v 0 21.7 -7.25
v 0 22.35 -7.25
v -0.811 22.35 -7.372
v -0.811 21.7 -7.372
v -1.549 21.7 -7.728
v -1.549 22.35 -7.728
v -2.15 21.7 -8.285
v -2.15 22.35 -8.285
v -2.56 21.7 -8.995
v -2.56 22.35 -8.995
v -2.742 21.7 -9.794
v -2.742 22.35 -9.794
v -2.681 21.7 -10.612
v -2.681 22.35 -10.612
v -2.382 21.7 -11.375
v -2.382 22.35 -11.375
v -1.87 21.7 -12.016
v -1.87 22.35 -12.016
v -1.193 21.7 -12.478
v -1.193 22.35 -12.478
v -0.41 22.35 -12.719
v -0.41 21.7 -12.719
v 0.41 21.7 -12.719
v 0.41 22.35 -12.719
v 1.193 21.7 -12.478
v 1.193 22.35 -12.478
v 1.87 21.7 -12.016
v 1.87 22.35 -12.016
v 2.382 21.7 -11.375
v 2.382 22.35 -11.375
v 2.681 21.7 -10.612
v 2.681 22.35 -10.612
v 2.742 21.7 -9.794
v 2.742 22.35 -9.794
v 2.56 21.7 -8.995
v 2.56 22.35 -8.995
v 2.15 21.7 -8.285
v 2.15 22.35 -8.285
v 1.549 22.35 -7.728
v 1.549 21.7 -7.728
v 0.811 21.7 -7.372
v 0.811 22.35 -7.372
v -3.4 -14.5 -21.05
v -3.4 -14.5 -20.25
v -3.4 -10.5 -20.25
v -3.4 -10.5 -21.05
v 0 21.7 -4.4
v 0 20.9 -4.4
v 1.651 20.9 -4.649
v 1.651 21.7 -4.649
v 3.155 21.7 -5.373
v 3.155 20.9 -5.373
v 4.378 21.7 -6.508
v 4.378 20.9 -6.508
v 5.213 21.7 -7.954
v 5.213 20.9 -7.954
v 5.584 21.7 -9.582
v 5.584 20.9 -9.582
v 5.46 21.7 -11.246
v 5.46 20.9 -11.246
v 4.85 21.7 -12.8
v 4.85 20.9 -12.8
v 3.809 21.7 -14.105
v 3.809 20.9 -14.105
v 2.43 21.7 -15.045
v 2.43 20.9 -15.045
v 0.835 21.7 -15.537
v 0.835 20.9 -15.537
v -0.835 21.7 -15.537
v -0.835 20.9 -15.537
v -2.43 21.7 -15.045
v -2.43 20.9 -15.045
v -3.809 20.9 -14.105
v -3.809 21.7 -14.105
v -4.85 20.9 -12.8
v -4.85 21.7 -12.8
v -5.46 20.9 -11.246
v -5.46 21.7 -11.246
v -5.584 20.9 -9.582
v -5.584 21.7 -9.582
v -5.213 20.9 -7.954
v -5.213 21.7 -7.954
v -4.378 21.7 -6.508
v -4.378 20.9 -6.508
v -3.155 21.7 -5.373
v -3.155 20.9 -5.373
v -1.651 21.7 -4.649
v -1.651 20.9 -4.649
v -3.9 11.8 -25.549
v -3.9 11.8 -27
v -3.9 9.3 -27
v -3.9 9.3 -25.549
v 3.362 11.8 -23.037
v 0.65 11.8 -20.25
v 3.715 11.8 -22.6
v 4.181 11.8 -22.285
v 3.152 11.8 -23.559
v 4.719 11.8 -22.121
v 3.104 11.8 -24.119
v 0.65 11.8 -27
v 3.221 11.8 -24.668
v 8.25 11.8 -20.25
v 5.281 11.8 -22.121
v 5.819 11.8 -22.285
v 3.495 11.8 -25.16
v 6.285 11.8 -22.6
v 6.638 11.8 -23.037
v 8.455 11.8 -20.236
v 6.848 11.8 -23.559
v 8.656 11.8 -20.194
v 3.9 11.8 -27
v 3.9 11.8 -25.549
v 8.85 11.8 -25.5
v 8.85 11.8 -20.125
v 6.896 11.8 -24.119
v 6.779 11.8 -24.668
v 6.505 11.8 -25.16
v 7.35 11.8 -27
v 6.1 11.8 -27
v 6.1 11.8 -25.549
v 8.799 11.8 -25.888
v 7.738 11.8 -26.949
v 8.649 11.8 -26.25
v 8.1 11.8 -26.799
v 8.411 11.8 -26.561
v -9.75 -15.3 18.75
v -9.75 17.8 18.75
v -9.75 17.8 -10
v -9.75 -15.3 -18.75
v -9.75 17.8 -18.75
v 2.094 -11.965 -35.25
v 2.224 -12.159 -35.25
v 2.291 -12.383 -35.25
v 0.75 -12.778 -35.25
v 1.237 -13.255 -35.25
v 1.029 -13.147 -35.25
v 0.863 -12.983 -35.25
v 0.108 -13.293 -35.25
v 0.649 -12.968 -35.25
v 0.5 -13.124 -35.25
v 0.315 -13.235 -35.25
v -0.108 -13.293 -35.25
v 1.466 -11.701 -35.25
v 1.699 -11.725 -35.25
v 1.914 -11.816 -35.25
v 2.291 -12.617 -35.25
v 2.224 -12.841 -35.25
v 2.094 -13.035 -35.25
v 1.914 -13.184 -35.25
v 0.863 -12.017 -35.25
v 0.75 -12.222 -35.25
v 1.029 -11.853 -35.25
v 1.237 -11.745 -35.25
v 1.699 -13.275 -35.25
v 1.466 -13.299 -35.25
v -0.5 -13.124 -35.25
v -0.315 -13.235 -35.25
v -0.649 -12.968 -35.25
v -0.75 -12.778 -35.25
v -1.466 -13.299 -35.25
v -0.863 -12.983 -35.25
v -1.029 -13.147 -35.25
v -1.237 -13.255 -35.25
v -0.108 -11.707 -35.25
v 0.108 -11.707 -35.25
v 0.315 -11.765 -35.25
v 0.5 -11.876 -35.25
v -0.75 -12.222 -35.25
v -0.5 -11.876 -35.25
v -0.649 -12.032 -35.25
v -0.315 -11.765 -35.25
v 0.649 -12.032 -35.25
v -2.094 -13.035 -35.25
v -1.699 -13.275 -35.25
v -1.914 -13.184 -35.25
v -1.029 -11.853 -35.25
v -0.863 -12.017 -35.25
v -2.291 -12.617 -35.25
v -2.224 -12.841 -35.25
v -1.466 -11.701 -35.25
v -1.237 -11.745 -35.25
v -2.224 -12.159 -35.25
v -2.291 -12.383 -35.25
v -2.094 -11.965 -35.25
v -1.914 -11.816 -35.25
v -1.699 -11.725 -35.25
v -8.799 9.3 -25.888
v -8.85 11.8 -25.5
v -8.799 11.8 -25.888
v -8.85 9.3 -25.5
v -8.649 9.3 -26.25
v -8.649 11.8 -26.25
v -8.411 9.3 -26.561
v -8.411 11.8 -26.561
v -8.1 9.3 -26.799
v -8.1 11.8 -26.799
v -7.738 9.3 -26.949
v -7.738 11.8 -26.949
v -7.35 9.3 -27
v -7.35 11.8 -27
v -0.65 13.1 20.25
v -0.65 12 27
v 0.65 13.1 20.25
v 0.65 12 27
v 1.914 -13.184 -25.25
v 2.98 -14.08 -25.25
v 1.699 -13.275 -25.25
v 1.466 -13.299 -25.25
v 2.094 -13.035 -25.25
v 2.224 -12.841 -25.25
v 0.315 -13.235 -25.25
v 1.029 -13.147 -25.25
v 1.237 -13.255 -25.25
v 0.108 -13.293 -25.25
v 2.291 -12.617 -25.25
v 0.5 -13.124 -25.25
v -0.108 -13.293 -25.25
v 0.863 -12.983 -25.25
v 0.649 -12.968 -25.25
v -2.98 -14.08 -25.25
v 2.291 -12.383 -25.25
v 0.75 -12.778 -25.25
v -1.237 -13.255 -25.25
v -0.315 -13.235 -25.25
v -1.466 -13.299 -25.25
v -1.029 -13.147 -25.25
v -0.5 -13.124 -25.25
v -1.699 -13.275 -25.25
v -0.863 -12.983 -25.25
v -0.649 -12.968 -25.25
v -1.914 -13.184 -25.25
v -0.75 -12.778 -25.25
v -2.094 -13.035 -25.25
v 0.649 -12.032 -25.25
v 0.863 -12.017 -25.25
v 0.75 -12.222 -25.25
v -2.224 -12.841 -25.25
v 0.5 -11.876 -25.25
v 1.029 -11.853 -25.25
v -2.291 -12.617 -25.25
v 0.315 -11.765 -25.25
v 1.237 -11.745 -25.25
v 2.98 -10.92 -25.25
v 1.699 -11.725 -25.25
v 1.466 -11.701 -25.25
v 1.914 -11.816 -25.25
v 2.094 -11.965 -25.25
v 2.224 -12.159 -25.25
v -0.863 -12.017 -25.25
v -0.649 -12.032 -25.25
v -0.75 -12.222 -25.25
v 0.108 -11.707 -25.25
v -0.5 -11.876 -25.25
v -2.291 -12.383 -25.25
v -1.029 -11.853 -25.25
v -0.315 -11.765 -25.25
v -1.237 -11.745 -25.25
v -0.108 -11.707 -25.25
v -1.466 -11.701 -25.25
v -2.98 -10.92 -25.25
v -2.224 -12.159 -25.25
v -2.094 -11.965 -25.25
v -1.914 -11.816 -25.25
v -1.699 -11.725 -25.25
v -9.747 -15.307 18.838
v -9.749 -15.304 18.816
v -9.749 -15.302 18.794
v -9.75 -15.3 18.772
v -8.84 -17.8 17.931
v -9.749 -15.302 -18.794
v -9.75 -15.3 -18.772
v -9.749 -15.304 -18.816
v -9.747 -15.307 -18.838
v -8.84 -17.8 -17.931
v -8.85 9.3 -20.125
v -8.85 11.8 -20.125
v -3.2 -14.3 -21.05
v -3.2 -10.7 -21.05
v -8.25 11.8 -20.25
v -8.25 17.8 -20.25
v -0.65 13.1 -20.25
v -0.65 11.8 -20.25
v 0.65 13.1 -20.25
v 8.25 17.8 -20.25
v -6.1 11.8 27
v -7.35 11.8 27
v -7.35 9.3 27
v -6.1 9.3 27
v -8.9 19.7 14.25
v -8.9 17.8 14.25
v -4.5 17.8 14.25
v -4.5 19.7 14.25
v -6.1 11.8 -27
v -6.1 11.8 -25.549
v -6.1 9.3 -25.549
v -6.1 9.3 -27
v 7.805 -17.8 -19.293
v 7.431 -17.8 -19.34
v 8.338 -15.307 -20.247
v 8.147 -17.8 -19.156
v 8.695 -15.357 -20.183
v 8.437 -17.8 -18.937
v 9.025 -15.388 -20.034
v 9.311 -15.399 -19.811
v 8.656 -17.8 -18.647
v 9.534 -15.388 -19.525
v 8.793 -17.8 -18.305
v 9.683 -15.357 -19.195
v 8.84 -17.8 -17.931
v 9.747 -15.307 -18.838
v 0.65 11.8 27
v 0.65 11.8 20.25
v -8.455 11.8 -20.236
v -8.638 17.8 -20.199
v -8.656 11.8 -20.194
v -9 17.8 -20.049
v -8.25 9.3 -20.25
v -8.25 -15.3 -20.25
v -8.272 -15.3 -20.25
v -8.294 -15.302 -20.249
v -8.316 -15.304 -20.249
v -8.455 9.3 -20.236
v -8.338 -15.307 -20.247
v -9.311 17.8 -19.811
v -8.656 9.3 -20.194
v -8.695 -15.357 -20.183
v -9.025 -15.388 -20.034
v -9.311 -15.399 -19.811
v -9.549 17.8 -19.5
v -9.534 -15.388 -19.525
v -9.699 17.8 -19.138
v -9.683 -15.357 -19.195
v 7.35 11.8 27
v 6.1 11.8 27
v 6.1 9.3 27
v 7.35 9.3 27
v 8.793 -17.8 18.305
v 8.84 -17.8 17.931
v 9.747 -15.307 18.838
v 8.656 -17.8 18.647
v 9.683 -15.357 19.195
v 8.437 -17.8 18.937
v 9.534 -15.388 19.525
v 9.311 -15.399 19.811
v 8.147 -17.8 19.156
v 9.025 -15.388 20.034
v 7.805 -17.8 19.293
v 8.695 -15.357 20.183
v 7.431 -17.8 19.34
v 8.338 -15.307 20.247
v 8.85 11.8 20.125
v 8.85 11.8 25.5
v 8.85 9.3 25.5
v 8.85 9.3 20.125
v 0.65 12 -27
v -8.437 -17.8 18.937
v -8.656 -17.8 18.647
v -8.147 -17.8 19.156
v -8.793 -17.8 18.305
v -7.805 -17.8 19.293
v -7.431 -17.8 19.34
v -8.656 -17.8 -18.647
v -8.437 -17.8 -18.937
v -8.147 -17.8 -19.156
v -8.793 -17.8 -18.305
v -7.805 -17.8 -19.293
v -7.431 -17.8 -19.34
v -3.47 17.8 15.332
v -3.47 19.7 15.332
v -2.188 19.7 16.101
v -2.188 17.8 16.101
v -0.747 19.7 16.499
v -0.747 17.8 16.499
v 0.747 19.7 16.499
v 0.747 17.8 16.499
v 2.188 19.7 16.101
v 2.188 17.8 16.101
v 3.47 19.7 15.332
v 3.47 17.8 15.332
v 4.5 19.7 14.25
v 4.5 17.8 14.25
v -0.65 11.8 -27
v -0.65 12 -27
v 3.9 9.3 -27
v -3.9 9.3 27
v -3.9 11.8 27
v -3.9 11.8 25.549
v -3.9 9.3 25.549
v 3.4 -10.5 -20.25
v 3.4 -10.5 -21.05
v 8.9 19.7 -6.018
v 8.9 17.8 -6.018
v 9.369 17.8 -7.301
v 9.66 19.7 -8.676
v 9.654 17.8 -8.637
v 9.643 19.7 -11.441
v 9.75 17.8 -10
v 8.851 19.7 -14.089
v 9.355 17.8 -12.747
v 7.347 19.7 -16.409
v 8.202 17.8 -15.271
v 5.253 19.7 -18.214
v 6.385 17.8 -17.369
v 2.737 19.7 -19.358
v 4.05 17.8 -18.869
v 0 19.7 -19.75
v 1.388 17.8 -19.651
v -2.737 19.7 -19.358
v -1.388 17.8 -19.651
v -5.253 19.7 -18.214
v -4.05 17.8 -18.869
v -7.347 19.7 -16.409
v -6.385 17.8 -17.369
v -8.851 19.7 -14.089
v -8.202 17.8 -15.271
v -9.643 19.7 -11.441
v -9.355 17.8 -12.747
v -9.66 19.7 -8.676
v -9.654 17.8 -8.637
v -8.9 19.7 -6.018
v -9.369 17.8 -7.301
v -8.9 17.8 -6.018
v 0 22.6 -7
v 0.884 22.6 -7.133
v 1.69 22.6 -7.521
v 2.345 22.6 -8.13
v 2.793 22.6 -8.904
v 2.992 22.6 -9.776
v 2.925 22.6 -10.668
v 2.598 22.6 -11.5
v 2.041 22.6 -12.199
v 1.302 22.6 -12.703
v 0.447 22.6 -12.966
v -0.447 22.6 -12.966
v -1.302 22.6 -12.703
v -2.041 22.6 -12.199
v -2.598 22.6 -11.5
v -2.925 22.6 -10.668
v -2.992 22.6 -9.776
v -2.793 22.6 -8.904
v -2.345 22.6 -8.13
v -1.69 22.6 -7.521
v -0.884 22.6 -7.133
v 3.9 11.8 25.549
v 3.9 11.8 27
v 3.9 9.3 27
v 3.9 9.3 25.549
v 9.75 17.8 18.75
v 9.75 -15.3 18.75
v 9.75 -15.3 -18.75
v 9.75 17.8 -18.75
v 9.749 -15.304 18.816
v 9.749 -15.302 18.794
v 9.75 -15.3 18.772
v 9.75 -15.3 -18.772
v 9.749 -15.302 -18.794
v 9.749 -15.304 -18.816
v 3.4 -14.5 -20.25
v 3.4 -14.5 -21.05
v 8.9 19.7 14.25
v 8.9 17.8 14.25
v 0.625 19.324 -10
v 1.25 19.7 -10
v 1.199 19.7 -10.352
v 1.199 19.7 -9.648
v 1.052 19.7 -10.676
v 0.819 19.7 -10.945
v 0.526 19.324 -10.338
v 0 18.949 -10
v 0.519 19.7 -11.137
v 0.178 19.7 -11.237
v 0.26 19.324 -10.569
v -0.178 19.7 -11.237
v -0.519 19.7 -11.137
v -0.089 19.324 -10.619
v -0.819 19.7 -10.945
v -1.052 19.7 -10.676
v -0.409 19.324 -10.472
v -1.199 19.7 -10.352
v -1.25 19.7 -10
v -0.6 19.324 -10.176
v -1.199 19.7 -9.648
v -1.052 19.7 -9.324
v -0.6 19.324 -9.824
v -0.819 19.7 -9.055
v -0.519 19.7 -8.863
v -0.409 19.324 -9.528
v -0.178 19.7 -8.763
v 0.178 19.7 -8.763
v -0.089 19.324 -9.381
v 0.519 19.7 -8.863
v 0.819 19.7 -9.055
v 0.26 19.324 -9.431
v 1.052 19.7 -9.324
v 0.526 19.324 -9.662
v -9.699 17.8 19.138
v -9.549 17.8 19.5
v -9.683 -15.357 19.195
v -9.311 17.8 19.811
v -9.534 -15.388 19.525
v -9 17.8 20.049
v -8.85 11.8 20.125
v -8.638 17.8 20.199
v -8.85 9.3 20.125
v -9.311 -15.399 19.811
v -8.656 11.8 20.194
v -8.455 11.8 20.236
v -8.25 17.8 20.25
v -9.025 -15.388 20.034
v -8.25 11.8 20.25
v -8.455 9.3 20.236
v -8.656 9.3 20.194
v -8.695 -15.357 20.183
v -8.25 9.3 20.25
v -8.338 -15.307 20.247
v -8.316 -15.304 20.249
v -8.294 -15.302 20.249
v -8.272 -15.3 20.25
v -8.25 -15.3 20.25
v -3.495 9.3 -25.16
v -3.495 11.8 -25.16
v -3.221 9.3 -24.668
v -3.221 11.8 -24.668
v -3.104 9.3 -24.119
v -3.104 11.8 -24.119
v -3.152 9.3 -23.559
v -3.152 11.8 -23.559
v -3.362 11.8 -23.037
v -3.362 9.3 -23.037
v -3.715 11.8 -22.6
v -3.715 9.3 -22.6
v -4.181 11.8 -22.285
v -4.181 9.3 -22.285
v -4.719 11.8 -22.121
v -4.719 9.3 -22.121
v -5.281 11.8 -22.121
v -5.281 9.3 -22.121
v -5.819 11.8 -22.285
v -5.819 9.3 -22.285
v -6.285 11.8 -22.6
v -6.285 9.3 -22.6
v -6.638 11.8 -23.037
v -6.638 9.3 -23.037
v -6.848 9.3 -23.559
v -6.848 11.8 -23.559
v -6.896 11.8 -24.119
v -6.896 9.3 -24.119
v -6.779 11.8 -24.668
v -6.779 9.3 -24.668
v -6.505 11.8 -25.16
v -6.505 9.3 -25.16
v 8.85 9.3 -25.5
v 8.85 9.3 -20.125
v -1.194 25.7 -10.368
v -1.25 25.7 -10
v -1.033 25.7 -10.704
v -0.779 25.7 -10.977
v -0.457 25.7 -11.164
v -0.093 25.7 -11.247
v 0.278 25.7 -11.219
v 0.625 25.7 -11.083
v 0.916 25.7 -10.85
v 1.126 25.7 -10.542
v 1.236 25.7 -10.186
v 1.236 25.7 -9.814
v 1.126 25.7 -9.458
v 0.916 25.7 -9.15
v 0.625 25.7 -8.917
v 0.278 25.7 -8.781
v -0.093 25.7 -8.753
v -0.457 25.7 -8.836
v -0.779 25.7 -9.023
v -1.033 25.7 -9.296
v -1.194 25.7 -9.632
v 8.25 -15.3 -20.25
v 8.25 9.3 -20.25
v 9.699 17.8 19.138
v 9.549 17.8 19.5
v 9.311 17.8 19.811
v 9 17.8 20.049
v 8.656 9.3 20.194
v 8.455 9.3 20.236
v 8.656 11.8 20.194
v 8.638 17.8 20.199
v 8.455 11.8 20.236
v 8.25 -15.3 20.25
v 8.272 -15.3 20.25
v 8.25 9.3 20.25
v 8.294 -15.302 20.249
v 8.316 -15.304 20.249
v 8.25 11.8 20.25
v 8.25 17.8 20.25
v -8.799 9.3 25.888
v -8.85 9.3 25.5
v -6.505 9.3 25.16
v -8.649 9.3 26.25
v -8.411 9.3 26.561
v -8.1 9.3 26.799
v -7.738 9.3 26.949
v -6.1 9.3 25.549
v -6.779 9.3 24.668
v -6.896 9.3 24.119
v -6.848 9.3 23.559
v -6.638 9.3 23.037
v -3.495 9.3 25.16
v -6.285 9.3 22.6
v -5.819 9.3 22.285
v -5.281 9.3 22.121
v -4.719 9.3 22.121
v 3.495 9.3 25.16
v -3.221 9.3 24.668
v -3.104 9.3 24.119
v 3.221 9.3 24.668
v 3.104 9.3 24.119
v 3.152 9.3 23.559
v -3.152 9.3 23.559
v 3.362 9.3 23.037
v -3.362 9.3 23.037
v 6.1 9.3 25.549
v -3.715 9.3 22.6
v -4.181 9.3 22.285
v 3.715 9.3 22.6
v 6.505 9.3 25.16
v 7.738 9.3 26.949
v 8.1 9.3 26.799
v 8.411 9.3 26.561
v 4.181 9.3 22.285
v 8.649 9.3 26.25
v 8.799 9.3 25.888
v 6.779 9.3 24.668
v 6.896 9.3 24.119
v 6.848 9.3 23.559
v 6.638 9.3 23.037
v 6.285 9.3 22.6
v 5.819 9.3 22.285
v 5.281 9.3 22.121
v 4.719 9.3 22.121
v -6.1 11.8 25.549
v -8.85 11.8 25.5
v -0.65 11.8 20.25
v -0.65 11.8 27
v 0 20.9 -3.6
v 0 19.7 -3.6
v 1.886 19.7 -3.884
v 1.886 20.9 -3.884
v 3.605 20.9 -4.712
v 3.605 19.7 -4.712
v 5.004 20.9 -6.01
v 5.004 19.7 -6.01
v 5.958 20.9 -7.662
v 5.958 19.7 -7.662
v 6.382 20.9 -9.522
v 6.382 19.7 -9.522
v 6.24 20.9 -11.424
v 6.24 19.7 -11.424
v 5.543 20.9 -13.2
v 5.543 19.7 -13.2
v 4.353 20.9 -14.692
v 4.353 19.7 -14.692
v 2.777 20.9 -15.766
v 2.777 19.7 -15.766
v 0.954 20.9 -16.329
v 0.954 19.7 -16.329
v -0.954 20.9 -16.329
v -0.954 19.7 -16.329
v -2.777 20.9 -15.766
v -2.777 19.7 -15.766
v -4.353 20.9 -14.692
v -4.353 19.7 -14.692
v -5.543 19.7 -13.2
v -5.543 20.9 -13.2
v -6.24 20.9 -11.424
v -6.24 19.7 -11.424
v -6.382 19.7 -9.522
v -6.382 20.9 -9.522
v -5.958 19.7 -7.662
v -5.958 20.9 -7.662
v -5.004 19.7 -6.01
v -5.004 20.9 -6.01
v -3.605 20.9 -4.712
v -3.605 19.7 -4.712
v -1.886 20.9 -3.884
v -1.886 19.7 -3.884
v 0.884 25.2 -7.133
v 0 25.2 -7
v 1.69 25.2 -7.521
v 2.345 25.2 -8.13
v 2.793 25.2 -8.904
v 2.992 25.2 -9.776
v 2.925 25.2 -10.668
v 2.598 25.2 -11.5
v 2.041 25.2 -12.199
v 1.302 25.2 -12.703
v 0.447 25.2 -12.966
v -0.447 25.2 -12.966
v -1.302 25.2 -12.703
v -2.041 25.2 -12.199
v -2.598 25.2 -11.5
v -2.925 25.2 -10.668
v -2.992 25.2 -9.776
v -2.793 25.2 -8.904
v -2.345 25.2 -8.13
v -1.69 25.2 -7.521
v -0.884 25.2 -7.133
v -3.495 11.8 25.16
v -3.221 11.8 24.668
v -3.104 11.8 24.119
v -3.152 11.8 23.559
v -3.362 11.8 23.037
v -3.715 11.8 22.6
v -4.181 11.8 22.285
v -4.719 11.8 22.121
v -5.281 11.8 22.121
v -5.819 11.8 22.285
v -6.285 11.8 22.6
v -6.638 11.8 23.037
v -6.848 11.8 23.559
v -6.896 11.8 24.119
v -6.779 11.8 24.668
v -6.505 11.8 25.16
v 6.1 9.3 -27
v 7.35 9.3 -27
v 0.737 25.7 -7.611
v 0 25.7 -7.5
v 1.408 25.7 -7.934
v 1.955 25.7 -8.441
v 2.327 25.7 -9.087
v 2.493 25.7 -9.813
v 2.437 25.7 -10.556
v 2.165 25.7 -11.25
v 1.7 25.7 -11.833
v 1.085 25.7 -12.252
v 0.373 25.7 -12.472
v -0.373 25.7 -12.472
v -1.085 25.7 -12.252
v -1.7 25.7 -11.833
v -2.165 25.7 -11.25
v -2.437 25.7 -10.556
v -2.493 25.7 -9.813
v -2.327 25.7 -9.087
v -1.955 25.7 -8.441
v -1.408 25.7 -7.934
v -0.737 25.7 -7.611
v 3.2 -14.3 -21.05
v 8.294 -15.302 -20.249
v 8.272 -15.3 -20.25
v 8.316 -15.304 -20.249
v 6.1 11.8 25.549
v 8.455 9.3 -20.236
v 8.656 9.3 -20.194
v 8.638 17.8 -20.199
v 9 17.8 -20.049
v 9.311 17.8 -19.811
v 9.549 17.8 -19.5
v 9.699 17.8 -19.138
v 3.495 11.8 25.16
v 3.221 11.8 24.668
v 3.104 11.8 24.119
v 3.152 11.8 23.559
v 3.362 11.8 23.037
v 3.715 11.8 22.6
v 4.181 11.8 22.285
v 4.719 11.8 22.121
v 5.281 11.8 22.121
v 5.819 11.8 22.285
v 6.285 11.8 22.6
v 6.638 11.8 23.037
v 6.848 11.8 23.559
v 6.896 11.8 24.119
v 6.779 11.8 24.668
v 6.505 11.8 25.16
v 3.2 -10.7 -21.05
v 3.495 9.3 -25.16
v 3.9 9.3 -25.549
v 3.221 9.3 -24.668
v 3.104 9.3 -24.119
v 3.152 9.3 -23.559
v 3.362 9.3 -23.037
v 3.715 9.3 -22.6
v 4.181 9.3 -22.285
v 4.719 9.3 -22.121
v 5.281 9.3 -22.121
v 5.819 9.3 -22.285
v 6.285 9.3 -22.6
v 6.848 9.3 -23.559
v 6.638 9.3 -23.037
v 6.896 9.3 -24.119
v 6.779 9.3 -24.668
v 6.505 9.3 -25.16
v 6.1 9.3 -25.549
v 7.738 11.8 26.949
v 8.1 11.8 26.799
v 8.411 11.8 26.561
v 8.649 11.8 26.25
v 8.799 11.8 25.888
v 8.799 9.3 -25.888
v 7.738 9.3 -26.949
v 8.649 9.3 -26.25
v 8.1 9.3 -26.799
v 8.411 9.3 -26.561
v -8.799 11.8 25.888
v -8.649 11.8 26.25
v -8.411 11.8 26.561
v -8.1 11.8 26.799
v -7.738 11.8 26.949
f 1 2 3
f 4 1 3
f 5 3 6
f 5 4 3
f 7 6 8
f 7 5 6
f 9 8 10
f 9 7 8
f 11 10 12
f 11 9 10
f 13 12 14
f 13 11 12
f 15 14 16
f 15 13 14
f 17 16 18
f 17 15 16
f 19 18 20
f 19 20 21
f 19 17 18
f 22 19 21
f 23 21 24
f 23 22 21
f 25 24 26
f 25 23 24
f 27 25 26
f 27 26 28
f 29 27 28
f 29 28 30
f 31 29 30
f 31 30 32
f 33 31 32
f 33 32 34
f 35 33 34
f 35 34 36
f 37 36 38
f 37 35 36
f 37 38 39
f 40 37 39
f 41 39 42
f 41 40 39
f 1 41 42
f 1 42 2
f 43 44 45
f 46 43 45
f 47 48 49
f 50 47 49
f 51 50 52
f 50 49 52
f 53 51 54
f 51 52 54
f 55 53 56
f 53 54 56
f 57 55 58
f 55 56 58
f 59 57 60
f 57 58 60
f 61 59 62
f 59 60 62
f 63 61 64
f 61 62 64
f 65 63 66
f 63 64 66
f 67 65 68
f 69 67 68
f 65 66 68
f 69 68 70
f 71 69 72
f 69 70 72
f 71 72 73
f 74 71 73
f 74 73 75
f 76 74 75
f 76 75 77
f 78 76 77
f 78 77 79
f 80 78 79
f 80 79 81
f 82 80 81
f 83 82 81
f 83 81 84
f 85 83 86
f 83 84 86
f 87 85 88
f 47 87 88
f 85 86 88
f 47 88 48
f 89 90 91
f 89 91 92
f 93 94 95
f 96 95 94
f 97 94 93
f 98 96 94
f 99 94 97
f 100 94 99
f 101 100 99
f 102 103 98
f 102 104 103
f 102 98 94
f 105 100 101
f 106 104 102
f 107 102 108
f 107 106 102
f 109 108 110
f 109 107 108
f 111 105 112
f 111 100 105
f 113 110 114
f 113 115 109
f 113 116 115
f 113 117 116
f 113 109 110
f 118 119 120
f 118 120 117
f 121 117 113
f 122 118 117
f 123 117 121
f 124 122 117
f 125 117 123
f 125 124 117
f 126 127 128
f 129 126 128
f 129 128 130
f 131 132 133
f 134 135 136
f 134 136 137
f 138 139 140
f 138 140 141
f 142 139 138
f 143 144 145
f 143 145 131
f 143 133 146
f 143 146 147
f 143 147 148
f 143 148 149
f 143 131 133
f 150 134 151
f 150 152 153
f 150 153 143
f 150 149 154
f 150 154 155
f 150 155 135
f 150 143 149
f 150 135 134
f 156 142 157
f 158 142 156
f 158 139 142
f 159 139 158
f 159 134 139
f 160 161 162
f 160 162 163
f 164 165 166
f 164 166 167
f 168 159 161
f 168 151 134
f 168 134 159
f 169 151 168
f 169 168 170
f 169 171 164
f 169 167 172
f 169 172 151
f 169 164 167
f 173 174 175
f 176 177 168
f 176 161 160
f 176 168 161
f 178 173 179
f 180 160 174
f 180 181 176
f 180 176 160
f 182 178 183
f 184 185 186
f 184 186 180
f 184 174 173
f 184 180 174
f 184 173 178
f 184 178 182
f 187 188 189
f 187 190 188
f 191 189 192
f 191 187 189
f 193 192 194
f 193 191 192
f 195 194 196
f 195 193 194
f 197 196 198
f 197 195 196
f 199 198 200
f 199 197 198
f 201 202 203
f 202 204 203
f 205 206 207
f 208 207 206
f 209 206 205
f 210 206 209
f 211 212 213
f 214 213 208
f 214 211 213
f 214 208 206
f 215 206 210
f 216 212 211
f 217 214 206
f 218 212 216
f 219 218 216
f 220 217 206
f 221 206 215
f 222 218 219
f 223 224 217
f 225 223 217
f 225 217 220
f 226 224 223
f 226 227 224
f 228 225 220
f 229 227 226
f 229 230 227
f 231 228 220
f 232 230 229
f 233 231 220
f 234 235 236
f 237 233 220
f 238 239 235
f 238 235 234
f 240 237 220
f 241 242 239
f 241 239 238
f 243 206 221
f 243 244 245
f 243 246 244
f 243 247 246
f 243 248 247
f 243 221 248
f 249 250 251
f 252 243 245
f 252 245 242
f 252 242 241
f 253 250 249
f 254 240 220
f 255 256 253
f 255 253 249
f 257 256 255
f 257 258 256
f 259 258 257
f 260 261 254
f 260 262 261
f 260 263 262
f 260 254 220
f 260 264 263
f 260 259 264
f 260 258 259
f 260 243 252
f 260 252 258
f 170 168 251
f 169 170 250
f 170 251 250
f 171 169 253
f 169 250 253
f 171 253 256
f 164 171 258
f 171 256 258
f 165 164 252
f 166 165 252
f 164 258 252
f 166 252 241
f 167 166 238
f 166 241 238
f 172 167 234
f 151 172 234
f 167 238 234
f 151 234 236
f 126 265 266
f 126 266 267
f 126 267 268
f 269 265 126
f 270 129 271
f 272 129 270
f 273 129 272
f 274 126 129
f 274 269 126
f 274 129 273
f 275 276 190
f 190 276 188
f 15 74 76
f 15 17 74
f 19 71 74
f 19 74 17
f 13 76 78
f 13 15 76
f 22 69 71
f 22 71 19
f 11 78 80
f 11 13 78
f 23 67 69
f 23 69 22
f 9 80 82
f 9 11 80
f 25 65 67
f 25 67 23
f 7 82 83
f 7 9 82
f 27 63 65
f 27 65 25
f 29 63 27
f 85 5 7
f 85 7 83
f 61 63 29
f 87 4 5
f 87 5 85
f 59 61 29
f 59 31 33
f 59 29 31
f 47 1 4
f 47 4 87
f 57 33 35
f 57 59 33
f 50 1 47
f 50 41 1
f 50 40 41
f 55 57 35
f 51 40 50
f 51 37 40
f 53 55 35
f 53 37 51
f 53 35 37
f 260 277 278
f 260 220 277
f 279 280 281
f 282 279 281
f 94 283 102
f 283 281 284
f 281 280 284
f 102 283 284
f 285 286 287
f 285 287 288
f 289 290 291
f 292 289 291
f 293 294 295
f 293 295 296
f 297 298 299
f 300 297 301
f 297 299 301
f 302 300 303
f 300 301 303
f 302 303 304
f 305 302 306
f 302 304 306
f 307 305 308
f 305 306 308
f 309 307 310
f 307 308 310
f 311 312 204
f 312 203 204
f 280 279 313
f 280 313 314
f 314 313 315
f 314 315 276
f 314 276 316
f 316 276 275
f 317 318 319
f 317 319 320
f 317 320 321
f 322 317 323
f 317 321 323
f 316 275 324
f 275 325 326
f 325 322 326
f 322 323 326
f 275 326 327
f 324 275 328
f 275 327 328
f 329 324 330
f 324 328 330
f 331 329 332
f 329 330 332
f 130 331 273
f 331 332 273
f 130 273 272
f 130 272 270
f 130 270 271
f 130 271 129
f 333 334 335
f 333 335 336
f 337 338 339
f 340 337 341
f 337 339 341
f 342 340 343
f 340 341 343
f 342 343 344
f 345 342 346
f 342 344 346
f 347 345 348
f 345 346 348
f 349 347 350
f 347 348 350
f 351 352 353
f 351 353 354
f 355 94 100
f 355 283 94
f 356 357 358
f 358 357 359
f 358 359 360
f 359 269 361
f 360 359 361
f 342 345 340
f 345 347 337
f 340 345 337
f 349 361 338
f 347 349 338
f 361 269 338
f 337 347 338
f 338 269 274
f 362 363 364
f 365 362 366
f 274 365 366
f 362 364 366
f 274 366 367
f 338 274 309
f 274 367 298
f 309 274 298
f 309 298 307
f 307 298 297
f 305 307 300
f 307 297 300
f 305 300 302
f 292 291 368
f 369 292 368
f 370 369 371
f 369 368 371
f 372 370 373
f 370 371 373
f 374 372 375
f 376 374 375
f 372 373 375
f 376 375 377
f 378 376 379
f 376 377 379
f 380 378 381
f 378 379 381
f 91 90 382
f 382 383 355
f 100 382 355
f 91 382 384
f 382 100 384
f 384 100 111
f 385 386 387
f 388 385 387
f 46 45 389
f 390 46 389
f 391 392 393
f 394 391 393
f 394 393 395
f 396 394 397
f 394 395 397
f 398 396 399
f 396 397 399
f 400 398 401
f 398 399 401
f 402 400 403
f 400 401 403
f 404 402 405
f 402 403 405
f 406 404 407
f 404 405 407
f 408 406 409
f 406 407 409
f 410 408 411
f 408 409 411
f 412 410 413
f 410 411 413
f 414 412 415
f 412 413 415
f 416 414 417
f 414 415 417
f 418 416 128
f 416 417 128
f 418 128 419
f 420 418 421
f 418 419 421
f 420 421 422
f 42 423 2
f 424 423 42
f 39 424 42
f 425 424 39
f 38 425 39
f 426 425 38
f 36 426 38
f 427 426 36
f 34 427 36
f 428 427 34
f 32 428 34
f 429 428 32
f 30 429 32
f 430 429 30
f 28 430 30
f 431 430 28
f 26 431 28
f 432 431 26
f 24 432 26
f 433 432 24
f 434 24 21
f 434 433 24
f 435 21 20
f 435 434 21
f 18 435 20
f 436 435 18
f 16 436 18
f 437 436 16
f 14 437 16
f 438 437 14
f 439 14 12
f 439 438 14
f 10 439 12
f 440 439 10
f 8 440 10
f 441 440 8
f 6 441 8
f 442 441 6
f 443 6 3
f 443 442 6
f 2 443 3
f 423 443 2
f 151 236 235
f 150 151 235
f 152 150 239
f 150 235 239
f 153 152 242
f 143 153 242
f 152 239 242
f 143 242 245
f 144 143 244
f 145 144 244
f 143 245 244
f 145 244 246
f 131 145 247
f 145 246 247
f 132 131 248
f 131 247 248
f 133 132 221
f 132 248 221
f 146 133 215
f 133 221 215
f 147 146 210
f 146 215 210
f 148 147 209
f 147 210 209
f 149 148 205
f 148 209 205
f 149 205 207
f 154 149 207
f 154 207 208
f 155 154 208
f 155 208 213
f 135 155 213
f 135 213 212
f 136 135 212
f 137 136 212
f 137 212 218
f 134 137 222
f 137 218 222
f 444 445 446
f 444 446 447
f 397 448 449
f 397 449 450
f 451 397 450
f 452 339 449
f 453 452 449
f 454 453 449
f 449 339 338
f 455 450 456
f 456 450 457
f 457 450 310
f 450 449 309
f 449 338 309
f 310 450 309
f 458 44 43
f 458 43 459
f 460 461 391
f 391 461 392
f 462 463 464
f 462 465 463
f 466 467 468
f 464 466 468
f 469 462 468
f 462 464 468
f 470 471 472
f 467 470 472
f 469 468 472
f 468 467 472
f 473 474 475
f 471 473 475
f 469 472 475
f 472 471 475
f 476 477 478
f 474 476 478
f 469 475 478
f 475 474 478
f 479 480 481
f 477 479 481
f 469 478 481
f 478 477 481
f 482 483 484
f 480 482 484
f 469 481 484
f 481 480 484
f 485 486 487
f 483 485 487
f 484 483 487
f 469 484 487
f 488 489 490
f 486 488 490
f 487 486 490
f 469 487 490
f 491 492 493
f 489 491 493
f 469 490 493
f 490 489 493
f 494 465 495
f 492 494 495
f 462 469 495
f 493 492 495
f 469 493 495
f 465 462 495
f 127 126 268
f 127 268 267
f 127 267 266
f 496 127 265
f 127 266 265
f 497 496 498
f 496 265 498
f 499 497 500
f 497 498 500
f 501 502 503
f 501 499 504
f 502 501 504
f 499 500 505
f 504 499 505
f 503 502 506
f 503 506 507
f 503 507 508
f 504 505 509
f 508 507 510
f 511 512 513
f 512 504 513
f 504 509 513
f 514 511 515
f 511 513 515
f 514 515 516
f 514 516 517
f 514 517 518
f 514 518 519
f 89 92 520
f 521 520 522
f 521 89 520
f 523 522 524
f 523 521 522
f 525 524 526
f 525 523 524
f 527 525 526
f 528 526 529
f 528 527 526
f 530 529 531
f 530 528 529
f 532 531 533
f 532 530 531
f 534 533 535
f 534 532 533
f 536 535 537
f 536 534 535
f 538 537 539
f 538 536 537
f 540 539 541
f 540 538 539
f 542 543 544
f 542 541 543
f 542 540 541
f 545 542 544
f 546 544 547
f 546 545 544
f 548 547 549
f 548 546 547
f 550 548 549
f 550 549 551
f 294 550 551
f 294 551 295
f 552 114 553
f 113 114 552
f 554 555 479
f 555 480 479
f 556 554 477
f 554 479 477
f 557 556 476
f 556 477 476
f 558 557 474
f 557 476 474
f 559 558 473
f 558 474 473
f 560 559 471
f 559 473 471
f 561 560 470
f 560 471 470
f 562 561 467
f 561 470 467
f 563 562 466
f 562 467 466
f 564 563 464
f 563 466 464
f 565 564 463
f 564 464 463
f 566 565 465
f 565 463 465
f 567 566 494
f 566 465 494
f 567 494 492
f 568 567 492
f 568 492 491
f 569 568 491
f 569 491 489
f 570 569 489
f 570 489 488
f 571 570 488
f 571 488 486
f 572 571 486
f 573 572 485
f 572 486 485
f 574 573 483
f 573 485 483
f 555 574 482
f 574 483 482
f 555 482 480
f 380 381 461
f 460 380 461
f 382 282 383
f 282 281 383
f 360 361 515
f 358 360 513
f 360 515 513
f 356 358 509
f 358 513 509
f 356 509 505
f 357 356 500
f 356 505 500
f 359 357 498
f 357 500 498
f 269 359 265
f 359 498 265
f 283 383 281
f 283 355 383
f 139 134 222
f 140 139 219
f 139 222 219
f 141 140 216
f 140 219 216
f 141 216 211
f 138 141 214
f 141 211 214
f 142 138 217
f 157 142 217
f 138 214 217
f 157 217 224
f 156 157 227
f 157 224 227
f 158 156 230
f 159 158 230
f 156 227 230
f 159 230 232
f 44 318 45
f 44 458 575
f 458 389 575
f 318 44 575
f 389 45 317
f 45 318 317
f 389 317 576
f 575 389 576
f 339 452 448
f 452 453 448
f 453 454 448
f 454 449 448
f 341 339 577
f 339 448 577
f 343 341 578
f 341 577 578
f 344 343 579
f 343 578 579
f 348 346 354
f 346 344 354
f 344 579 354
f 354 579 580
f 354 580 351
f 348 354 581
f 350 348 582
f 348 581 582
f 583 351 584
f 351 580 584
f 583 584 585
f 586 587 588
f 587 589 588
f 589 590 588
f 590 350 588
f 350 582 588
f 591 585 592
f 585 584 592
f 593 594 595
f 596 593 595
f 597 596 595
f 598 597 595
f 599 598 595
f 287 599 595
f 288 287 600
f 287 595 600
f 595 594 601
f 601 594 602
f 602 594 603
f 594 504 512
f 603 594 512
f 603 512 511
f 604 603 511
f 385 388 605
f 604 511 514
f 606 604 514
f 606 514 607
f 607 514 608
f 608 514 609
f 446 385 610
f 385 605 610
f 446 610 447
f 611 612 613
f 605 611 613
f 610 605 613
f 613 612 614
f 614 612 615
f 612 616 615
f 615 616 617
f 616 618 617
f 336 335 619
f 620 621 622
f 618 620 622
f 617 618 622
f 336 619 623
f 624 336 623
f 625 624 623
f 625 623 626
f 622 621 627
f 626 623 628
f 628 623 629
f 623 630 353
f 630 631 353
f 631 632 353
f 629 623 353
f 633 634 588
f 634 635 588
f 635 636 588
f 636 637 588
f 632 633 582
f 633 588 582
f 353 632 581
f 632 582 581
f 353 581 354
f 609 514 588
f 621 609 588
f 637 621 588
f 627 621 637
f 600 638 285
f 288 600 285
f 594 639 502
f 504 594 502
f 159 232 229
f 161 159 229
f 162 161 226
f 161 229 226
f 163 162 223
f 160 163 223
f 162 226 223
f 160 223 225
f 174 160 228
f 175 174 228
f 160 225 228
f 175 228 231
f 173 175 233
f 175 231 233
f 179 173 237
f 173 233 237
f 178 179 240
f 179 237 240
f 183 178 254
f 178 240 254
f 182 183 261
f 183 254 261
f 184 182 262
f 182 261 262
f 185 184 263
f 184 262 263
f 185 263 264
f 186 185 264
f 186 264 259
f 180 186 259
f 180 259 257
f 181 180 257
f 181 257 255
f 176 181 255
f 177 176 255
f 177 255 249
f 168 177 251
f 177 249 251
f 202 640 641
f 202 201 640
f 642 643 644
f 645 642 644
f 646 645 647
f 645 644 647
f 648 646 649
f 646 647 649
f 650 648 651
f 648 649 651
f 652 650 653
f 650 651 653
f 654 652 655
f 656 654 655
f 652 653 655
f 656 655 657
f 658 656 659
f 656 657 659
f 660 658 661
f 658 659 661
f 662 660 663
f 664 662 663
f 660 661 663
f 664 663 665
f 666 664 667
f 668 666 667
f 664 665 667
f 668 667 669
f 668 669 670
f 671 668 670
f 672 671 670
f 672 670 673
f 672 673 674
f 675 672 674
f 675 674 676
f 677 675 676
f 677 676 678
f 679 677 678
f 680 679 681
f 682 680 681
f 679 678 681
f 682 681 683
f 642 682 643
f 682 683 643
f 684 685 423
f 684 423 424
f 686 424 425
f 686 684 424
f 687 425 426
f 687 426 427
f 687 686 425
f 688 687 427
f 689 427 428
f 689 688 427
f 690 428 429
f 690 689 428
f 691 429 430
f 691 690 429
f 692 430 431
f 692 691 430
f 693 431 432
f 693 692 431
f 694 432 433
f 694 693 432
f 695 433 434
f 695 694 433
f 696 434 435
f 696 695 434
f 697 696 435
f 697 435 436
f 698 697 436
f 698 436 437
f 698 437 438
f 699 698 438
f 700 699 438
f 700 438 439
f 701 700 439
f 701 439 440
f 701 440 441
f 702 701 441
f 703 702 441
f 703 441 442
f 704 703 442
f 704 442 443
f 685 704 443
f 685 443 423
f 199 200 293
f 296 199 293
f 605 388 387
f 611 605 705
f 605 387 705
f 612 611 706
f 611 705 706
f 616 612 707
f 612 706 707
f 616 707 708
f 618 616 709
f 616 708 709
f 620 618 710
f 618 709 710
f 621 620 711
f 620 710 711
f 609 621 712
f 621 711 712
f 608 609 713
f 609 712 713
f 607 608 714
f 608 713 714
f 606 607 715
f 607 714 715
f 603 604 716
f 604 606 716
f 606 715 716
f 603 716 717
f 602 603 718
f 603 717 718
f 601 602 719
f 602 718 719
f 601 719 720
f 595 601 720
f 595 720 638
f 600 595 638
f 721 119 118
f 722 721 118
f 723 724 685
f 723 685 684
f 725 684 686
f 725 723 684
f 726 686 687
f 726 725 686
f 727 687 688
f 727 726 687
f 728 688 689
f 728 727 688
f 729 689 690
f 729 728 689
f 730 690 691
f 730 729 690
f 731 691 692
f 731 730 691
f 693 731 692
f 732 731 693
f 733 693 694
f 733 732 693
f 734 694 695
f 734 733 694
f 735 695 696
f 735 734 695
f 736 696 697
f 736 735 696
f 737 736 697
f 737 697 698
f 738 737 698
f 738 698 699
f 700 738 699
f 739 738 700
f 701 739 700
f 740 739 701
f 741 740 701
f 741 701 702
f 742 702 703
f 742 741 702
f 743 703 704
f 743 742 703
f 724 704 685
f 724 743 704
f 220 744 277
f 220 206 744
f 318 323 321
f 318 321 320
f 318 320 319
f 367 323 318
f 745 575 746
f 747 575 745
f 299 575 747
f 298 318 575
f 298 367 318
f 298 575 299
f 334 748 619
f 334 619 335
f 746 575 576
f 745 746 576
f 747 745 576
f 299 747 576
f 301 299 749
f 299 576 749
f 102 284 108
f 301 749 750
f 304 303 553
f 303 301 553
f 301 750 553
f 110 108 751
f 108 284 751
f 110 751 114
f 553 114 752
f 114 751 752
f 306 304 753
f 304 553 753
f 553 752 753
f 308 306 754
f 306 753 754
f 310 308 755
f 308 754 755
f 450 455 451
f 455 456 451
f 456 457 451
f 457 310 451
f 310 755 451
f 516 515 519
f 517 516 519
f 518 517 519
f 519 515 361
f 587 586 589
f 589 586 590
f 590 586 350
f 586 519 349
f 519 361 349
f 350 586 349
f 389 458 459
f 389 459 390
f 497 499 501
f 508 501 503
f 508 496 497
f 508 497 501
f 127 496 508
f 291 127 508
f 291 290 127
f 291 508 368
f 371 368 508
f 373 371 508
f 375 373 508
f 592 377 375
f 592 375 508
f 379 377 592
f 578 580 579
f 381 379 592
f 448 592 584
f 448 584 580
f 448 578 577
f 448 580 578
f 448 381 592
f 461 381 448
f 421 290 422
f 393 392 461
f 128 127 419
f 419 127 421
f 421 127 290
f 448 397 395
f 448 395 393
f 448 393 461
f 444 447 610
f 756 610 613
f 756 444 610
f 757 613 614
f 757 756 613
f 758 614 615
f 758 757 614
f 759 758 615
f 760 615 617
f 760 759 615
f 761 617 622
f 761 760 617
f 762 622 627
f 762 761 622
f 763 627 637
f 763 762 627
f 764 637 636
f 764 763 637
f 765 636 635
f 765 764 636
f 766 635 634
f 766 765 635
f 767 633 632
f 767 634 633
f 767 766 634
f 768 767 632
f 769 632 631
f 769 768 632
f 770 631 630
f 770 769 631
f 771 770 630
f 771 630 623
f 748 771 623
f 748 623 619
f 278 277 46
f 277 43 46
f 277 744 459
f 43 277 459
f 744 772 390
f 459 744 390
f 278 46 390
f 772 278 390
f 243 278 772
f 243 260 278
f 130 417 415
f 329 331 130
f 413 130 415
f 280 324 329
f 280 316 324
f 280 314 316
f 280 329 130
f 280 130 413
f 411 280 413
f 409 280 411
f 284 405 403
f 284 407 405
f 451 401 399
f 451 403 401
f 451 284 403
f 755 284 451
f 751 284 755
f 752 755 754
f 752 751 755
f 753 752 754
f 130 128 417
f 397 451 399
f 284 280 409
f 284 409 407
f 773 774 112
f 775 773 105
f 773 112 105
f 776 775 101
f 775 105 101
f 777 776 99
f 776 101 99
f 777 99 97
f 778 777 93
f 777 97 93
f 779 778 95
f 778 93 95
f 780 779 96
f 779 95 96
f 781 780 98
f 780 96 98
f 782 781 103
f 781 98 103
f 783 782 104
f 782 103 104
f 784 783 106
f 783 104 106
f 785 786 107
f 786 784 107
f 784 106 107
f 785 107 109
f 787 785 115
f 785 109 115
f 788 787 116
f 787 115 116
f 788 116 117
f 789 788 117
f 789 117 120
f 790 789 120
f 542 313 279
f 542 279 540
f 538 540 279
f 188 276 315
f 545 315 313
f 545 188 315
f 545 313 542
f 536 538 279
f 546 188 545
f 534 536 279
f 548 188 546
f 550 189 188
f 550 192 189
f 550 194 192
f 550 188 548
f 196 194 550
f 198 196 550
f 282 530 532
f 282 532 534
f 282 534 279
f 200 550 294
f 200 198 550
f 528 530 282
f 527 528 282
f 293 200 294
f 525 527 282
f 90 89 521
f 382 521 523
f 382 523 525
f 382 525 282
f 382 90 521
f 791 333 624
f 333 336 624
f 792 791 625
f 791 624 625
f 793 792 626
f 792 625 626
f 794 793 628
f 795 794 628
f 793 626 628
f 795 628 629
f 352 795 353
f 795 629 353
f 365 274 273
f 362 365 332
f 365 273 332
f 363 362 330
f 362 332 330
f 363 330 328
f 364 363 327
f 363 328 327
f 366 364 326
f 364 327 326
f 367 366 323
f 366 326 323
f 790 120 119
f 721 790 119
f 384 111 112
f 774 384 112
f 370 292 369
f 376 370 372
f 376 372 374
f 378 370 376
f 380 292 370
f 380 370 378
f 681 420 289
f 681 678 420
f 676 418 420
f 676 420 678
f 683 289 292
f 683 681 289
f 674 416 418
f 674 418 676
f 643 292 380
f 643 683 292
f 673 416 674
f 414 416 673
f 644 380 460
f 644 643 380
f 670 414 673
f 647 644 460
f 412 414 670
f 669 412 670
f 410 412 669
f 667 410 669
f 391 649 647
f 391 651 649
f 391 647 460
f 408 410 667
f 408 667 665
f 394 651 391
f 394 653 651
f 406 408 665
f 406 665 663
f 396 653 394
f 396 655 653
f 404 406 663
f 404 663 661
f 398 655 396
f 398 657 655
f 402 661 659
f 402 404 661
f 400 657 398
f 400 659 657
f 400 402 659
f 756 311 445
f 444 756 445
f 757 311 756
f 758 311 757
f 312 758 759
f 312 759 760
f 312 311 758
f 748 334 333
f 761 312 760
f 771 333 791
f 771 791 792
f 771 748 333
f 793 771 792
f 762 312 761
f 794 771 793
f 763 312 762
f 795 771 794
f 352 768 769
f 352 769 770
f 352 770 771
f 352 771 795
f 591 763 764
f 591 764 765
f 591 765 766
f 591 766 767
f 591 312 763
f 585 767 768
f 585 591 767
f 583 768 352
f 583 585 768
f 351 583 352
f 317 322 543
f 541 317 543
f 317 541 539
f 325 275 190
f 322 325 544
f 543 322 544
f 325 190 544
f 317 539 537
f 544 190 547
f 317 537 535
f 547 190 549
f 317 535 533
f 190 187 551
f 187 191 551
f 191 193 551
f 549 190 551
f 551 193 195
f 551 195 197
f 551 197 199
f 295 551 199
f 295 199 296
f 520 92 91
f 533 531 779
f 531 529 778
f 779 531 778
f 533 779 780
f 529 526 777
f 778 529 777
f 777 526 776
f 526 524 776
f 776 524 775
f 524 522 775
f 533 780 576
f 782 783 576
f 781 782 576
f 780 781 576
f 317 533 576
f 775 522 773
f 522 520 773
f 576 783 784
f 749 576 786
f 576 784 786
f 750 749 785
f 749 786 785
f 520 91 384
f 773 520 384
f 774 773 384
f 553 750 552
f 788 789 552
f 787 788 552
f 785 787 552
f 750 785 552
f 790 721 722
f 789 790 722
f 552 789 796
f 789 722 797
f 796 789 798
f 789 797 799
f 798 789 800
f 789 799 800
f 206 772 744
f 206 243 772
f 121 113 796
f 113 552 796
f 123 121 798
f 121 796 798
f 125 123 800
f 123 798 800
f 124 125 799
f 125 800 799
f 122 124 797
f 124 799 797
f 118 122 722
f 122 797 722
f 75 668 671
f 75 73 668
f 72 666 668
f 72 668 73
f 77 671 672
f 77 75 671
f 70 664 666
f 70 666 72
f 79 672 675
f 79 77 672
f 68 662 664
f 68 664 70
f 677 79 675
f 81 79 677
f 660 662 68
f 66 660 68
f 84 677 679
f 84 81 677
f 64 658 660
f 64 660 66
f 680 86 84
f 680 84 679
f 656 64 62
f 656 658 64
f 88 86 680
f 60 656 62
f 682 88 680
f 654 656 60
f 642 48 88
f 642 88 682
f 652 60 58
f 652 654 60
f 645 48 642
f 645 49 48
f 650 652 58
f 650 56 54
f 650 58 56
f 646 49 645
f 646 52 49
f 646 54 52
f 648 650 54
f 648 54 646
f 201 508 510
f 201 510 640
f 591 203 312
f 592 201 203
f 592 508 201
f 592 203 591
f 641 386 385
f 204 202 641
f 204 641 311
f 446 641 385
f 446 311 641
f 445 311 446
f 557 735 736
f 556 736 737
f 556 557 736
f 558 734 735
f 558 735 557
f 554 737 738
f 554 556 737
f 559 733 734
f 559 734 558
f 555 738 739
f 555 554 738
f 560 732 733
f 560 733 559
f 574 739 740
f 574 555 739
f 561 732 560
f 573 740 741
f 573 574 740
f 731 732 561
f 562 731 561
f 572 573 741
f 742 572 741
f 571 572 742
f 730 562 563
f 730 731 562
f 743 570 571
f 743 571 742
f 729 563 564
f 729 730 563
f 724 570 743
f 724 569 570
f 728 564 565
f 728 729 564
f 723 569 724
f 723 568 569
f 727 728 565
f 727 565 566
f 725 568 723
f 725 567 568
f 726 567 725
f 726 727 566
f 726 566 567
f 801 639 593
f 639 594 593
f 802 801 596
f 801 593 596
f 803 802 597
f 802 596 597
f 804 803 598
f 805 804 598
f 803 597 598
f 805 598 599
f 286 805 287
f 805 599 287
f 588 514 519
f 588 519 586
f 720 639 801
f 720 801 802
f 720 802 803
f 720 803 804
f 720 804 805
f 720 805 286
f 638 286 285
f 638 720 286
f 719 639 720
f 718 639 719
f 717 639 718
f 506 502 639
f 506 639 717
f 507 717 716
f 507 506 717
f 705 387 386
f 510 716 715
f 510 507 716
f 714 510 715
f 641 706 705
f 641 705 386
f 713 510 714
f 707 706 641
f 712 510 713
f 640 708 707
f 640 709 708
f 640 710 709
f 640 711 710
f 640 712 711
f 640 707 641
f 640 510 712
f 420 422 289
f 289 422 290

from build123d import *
from OCP.BRepFilletAPI import BRepFilletAPI_MakeChamfer

# Parameters (mm, degrees)
SKETCH2_W                 = 19.5
SKETCH2_H                 = 40.5
BOSS_EXTRUDE1_DEPTH       = 17.8
CHAMFER1_SIZE             = 2.5
CHAMFER1_SIZE2            = 0.909925586
FILLET1_R                 = 1.5
BOSS_EXTRUDE2_START       = -6
SKETCH3_W                 = 17.7
SKETCH3_H                 = 54
BOSS_EXTRUDE2_DEPTH       = 2.5
FILLET2_R                 = 1.5
BOSS_EXTRUDE3_DEPTH       = 0.65
BOSS_EXTRUDE4_DEPTH       = 1.9
SKETCH6_R                 = 6.4
BOSS_EXTRUDE5_DEPTH       = 1.2
SKETCH7_R                 = 5.6
BOSS_EXTRUDE6_DEPTH       = 0.8
SKETCH8_R                 = 2.75
BOSS_EXTRUDE7_DEPTH       = 4
SKETCH9_R                 = 3
BOSS_EXTRUDE8_DEPTH       = 3.4
CHAMFER2_SIZE             = 0.3
CHAMFER3_SIZE             = 0.5
CUT_EXTRUDE1_REACH        = 43.234
MIRROR3_COPY_1_REACH      = 43.234
SKETCH12_W                = 6.8
SKETCH12_H                = 4
BOSS_EXTRUDE9_DEPTH       = 0.8
SKETCH13_W                = 6.4
SKETCH13_H                = 3.6
BOSS_EXTRUDE10_DEPTH      = 4.2
BOSS_EXTRUDE10_TAPER      = 3
BOSS_EXTRUDE11_DEPTH      = 10
M3X0_5_TAPPED_HOLE1_D     = 2.5
M3X0_5_TAPPED_HOLE1_DEPTH = 6
M3X0_5_TAPPED_HOLE1_TIP   = 0.751075774


with BuildPart() as part:
    # Sketch2 → Boss-Extrude1 (new, symmetric)
    with BuildSketch(Plane(origin=(0, 0, 0), x_dir=(1, 0, 0), z_dir=(0, 1, 0))):
        Rectangle(SKETCH2_W, SKETCH2_H)
    extrude(amount=BOSS_EXTRUDE1_DEPTH, both=True)

    # Chamfer1: one chamfer whose edges measure the first distance from different faces: ONE call of the kernel's chamfer builder (chamfer() names one face for all edges)
    chamfer1_edges_1 = [part.edges().sort_by_distance(p)[0] for p in [
        (0, -17.8, -20.25),
    ]]
    chamfer1_side_1 = [part.faces().sort_by_distance(p)[0] for p in [
        (0, 0, -20.25),
    ]]
    chamfer1_edges_2 = [part.edges().sort_by_distance(p)[0] for p in [
        (9.75, -17.8, 0),
    ]]
    chamfer1_side_2 = [part.faces().sort_by_distance(p)[0] for p in [
        (9.75, 0, 0),
    ]]
    chamfer1_edges_3 = [part.edges().sort_by_distance(p)[0] for p in [
        (0, -17.8, 20.25),
    ]]
    chamfer1_side_3 = [part.faces().sort_by_distance(p)[0] for p in [
        (0, 0, 20.25),
    ]]
    chamfer1_edges_4 = [part.edges().sort_by_distance(p)[0] for p in [
        (-9.75, -17.8, 0),
    ]]
    chamfer1_side_4 = [part.faces().sort_by_distance(p)[0] for p in [
        (-9.75, 0, 0),
    ]]
    chamfer1 = BRepFilletAPI_MakeChamfer(part.part.solid().wrapped)
    for e in chamfer1_edges_1:
        chamfer1.Add(CHAMFER1_SIZE, CHAMFER1_SIZE2, e.wrapped, chamfer1_side_1[0].wrapped)  # the first distance lies on this face
    for e in chamfer1_edges_2:
        chamfer1.Add(CHAMFER1_SIZE, CHAMFER1_SIZE2, e.wrapped, chamfer1_side_2[0].wrapped)  # the first distance lies on this face
    for e in chamfer1_edges_3:
        chamfer1.Add(CHAMFER1_SIZE, CHAMFER1_SIZE2, e.wrapped, chamfer1_side_3[0].wrapped)  # the first distance lies on this face
    for e in chamfer1_edges_4:
        chamfer1.Add(CHAMFER1_SIZE, CHAMFER1_SIZE2, e.wrapped, chamfer1_side_4[0].wrapped)  # the first distance lies on this face
    add(Compound.cast(chamfer1.Shape()), mode=Mode.REPLACE)

    # Fillet1
    # the kernel refuses this fillet: 1.5 mm, written as the material it takes off along each edge
    with BuildSketch(Plane(origin=(-10.829006934, -12.335452813, -21.329006934), x_dir=(0.9461886483394649, 0.3040991697893321, -0.11068304606838018), z_dir=(0.3236155771181854, -0.8891264907159878, 0.32361557711818534)), Plane(origin=(-10.829006934, -12.335452813, 21.329006934), x_dir=(-0.1106830460683806, 0.30409916978933194, -0.946188648339465), z_dir=(0.32361557711818534, -0.8891264907159879, -0.3236155771181854))) as fillet1_piece_1:
        with BuildLine():
            CenterArc((FILLET1_R * 0.889126490716, FILLET1_R), FILLET1_R, 186.717713464, 83.282286536)
            Line((-FILLET1_R * 0.104008041637, FILLET1_R * 0.883022221559), (0, 0))
            Line((0, 0), (FILLET1_R * 0.889126490716, 0))
        make_face()
    extrude(amount=9.480197094, mode=Mode.SUBTRACT)
    with BuildSketch(Plane(origin=(10.829006934, -12.335452813, -21.329006934), x_dir=(-0.946188648339465, 0.30409916978933194, -0.1106830460683806), z_dir=(-0.3236155771181854, -0.8891264907159879, 0.3236155771181854)), Plane(origin=(10.829006934, -12.335452813, 21.329006934), x_dir=(0.11068304606838136, 0.3040991697893317, -0.9461886483394651), z_dir=(-0.3236155771181854, -0.8891264907159879, -0.3236155771181854))) as fillet1_piece_2:
        with BuildLine():
            CenterArc((FILLET1_R * 0.889126490716, -FILLET1_R), FILLET1_R, 90, 83.282286536)
            Line((-FILLET1_R * 0.104008041637, -FILLET1_R * 0.883022221559), (0, 0))
            Line((0, 0), (FILLET1_R * 0.889126490716, 0))
        make_face()
    extrude(amount=9.480197094, mode=Mode.SUBTRACT)
    with BuildSketch(Plane(origin=(-9.75, -19.05, -20.25), x_dir=(1, 0, 0), z_dir=(0, 1, 0)), Plane(origin=(9.75, 21.55, -20.25), x_dir=(-1, 0, 0), z_dir=(0, -1, 0)), Plane(origin=(9.75, 21.55, 20.25), x_dir=(0, 0, -1), z_dir=(0, -1, 0)), Plane(origin=(-9.75, -19.05, 20.25), x_dir=(0, 0, -1), z_dir=(0, 1, 0))) as fillet1_piece_3:
        with BuildLine():
            CenterArc((FILLET1_R, -FILLET1_R), FILLET1_R, 90, 90)
            Line((0, -FILLET1_R), (0, 0))
            Line((0, 0), (FILLET1_R, 0))
        make_face()
    extrude(amount=40.6, mode=Mode.SUBTRACT)

    # Sketch3 → Boss-Extrude2 (add)
    with BuildSketch(Plane(origin=(0, 17.8, 0), x_dir=(1, 0, 0), z_dir=(0, 1, 0)).offset(BOSS_EXTRUDE2_START)):
        Rectangle(SKETCH3_W, SKETCH3_H)
    extrude(amount=-BOSS_EXTRUDE2_DEPTH)

    # Fillet2
    fillet2_edges = [part.edges().sort_by_distance(p)[0] for p in [
        (-8.85, 10.55, 27),
        (8.85, 10.55, -27),
        (-8.85, 10.55, -27),
        (8.85, 10.55, 27),
    ]]
    fillet(fillet2_edges, radius=FILLET2_R)

    # Sketch4 → Boss-Extrude3 (add, symmetric)
    with BuildSketch(Plane(origin=(0, 0, 0), x_dir=(0, 0, -1), z_dir=(1, 0, 0))):
        Polygon((-20.25, 11.8), (-27, 11.8), (-27, 12), (-20.25, 13.1), align=None)
    boss_extrude3 = extrude(amount=BOSS_EXTRUDE3_DEPTH, both=True)

    # Mirror1: Boss-Extrude3 across plane
    add(boss_extrude3.mirror(Plane.XY))

    # Sketch5 → Boss-Extrude4 (add)
    with BuildSketch(Plane(origin=(0, 17.8, 0), x_dir=(1, 0, 0), z_dir=(0, 1, 0))):
        with BuildLine():
            Line((-8.9, 6.01848019), (-8.9, -14.25))
            Line((-8.9, -14.25), (-4.5, -14.25))
            ThreePointArc((-4.5, -14.25), (0, -16.55), (4.5, -14.25))
            Line((4.5, -14.25), (8.9, -14.25))
            Line((8.9, -14.25), (8.9, 6.01848019))
            ThreePointArc((8.9, 6.01848019), (0, 19.75), (-8.9, 6.01848019))
        make_face()
    extrude(amount=BOSS_EXTRUDE4_DEPTH)

    # Sketch6 → Boss-Extrude5 (add)
    with BuildSketch(Plane(origin=(0, 19.7, 0), x_dir=(1, 0, 0), z_dir=(0, 1, 0))):
        with Locations(Location((0, 10, 0), (0, 0, 270))):
            Circle(SKETCH6_R)
    extrude(amount=BOSS_EXTRUDE5_DEPTH)

    # Sketch7 → Boss-Extrude6 (add)
    with BuildSketch(Plane(origin=(0, 20.9, 0), x_dir=(1, 0, 0), z_dir=(0, 1, 0))):
        with Locations(Location((0, 10, 0), (0, 0, 270))):
            Circle(SKETCH7_R)
    extrude(amount=BOSS_EXTRUDE6_DEPTH)

    # Sketch8 → Boss-Extrude7 (add)
    with BuildSketch(Plane(origin=(0, 21.7, 0), x_dir=(1, 0, 0), z_dir=(0, 1, 0))):
        with Locations(Location((0, 10, 0), (0, 0, 270))):
            Circle(SKETCH8_R)
    extrude(amount=BOSS_EXTRUDE7_DEPTH)

    # Sketch9 → Boss-Extrude8 (add)
    with BuildSketch(Plane(origin=(0, 25.7, 0), x_dir=(1, 0, 0), z_dir=(0, 1, 0))):
        with Locations(Location((0, 10, 0), (0, 0, 270))):
            Circle(SKETCH9_R)
    extrude(amount=-BOSS_EXTRUDE8_DEPTH)

    # Chamfer2
    # the kernel refuses this chamfer: 0.3 mm, written as the material it takes off along each edge
    with BuildSketch(Plane(origin=(0, 22.3, -10), x_dir=(0, 0, 1), z_dir=(-1, 0, 0))) as chamfer2_piece_1_section:
        Polygon((3 - CHAMFER2_SIZE, 0), (3, CHAMFER2_SIZE), (3, 0), align=None)
    chamfer2_piece_1 = revolve(axis=Axis((0, 22.3, -10), (0, 1, 0)), mode=Mode.PRIVATE)
    chamfer2_piece_1 = chamfer2_piece_1 - Plane(origin=(0, 22.47249354, -10), x_dir=(0, 0, 1), z_dir=(0, -1, 0)) * Cylinder(2.75, 12, mode=Mode.PRIVATE)
    add(chamfer2_piece_1, mode=Mode.SUBTRACT)

    # Chamfer3
    chamfer3_edges = [part.edges().sort_by_distance(p)[0] for p in [
        (0, 25.7, -13),
    ]]
    chamfer(chamfer3_edges, length=CHAMFER3_SIZE)

    # Sketch11 → Cut-Extrude1 (cut, up to next)
    with BuildSketch(Plane(origin=(0, 11.8, 0), x_dir=(1, 0, 0), z_dir=(0, 1, 0)), mode=Mode.PRIVATE) as cut_extrude1_sk1:
        with BuildLine():
            Line((6.1, -27), (3.9, -27))
            Line((3.9, -27), (3.9, -25.549193338))
            ThreePointArc((3.9, -25.549193338), (5, -22.1), (6.1, -25.549193338))
            Line((6.1, -25.549193338), (6.1, -27))
        make_face()
    cut_extrude1_tool1 = extrude(cut_extrude1_sk1.sketch, amount=-CUT_EXTRUDE1_REACH, mode=Mode.PRIVATE) & part.part
    cut_extrude1 = cut_extrude1_tool1.solids().sort_by_distance((5, 11.8, 24.454928))[0]
    add(cut_extrude1, mode=Mode.SUBTRACT)

    # Mirror2: Cut-Extrude1 across plane
    add(cut_extrude1.mirror(Plane(origin=(0, 0, 0), x_dir=(0, 0, 1), z_dir=(1, 0, 0))), mode=Mode.SUBTRACT)

    # Mirror3: Cut-Extrude1 across plane
    add(cut_extrude1.mirror(Plane.XY), mode=Mode.SUBTRACT)

    # Mirror3 copy 1 sketch → Mirror3 copy 1 (cut, up to next)
    with BuildSketch(Plane(origin=(0, 11.8, 0), x_dir=(-1, 0, 0), z_dir=(0, 1, 0)), mode=Mode.PRIVATE) as mirror3_copy_1_sk1:
        with BuildLine():
            Line((6.1, -27), (3.9, -27))
            Line((3.9, -27), (3.9, -25.549193338))
            ThreePointArc((3.9, -25.549193338), (5, -22.1), (6.1, -25.549193338))
            Line((6.1, -25.549193338), (6.1, -27))
        make_face()
    mirror3_copy_1_tool1 = extrude(mirror3_copy_1_sk1.sketch, amount=-MIRROR3_COPY_1_REACH, mode=Mode.PRIVATE) & part.part
    add(mirror3_copy_1_tool1.solids().sort_by_distance((-5, 11.8, -24.454928))[0], mode=Mode.SUBTRACT)

    # Sketch12 → Boss-Extrude9 (add)
    with BuildSketch(Plane.XY.offset(-20.25)):
        with Locations((0, -12.5)):
            Rectangle(SKETCH12_W, SKETCH12_H)
    extrude(amount=-BOSS_EXTRUDE9_DEPTH)

    # Sketch13 → Boss-Extrude10 (add)
    with BuildSketch(Plane(origin=(0, 0, -21.05), x_dir=(-1, 0, 0), z_dir=(0, 0, -1))):
        with Locations((0, -12.5)):
            Rectangle(SKETCH13_W, SKETCH13_H)
    extrude(amount=BOSS_EXTRUDE10_DEPTH, taper=BOSS_EXTRUDE10_TAPER)

    # Sketch14 → Boss-Extrude11 (add)
    with BuildSketch(Plane(origin=(0, 0, -25.25), x_dir=(-1, 0, 0), z_dir=(0, 0, -1))):
        with BuildLine():
            ThreePointArc((0.75, -12.778388218), (2.3, -12.5), (0.75, -12.221611782))
            ThreePointArc((0.75, -12.221611782), (0, -11.7), (-0.75, -12.221611782))
            ThreePointArc((-0.75, -12.221611782), (-2.3, -12.5), (-0.75, -12.778388218))
            ThreePointArc((-0.75, -12.778388218), (0, -13.3), (0.75, -12.778388218))
        make_face()
    extrude(amount=BOSS_EXTRUDE11_DEPTH)

    # M3x0.5 Tapped Hole1
    with Locations(Plane(origin=(0, 25.7, 0), x_dir=(1, 0, 0), z_dir=(0, 1, 0))):
        with Locations((0, 10)):
            Hole(M3X0_5_TAPPED_HOLE1_D / 2, depth=M3X0_5_TAPPED_HOLE1_DEPTH)
            with Locations((0, 0, -(M3X0_5_TAPPED_HOLE1_DEPTH + M3X0_5_TAPPED_HOLE1_TIP / 2))):  # 118° drill point
                Cone(0, M3X0_5_TAPPED_HOLE1_D / 2, M3X0_5_TAPPED_HOLE1_TIP, mode=Mode.SUBTRACT)


solid = part.part
